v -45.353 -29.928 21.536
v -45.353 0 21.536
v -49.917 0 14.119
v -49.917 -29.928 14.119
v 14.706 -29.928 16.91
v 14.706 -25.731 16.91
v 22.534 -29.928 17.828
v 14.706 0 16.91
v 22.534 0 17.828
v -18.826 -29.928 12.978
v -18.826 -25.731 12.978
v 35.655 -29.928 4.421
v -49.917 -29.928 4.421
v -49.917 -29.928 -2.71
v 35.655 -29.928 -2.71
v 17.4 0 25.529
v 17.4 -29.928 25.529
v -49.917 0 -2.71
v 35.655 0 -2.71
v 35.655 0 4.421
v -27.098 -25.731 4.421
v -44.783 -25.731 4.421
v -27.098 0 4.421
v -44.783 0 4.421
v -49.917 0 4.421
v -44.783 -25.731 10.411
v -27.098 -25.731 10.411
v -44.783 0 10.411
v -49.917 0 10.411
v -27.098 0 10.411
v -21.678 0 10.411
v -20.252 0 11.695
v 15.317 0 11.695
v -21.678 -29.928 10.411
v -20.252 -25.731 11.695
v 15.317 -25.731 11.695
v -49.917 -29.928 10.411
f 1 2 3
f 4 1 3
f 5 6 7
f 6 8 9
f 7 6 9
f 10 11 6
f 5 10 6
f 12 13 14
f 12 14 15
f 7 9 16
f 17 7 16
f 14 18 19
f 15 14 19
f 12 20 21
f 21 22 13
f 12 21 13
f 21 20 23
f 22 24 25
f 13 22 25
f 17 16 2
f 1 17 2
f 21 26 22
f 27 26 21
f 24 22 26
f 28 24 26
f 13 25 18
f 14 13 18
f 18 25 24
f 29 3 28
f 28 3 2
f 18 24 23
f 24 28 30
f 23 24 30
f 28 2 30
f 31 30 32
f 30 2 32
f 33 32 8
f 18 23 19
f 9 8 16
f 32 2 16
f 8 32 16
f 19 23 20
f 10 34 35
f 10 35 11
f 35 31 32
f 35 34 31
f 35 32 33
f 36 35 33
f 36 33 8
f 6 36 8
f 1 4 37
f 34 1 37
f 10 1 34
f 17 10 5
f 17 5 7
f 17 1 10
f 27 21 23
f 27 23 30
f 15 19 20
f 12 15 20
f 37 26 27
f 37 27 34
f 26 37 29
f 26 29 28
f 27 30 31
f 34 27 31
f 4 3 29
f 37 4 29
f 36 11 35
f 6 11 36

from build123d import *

# Parameters (mm, degrees)
F0_W     = 17.6849197596
F0_H     = 5.9900539927
F1_DEPTH = 25.4
F2_DEPTH = 29.92783
F3_DEPTH = 0.33087


with BuildPart() as f1:
    # F0 (on Front) → F1 (new body)
    with BuildSketch(Plane.XZ):
        Polygon((-27.0978603512, 4.4212299399), (-44.7827801108, 4.4212299399), (-49.9171130359, 4.4212299399), (-49.9171130359, -2.7097861748), (35.6550812721, -2.7097861748), (35.6550812721, 4.4212299399), align=None)
        Polygon((15.317424354, 11.6948666982), (14.7060211414, 16.9097762866), (-18.8258830458, 12.9784494638), (-20.2520862222, 11.6948666982), align=None)
        with Locations((-35.940320231, 7.4162569363)):
            Rectangle(F0_W, F0_H)
        Polygon((17.3996798694, 25.529038161), (-45.3532636166, 21.5356685221), (-49.9171130359, 14.11941275), (-49.9171130359, 10.4112839326), (-44.7827801108, 10.4112839326), (-27.0978603512, 10.4112839326), (-21.6782893986, 10.4112839326), (-20.2520862222, 11.6948666982), (-18.8258830458, 12.9784494638), (14.7060211414, 16.9097762866), (22.5340109318, 17.8275406361), align=None)
    extrude(amount=F1_DEPTH)

    # F0 (on Front) → F2 (join)
    with BuildSketch(Plane.XZ):
        Polygon((17.3996798694, 25.529038161), (-45.3532636166, 21.5356685221), (-49.9171130359, 14.11941275), (-49.9171130359, 10.4112839326), (-44.7827801108, 10.4112839326), (-27.0978603512, 10.4112839326), (-21.6782893986, 10.4112839326), (-20.2520862222, 11.6948666982), (-18.8258830458, 12.9784494638), (14.7060211414, 16.9097762866), (22.5340109318, 17.8275406361), align=None)
        Polygon((-27.0978603512, 4.4212299399), (-44.7827801108, 4.4212299399), (-49.9171130359, 4.4212299399), (-49.9171130359, -2.7097861748), (35.6550812721, -2.7097861748), (35.6550812721, 4.4212299399), align=None)
    extrude(amount=F2_DEPTH)

    # F3 (add): faces of the model
    f3_faces = [f1.faces().sort_by_distance(p)[0] for p in [
        (1.3459851792, -25.4, 13.5050170467),
        (-35.940320231, -25.4, 7.4162569363),
    ]]
    extrude(f3_faces, amount=F3_DEPTH)


solid = f1.part
